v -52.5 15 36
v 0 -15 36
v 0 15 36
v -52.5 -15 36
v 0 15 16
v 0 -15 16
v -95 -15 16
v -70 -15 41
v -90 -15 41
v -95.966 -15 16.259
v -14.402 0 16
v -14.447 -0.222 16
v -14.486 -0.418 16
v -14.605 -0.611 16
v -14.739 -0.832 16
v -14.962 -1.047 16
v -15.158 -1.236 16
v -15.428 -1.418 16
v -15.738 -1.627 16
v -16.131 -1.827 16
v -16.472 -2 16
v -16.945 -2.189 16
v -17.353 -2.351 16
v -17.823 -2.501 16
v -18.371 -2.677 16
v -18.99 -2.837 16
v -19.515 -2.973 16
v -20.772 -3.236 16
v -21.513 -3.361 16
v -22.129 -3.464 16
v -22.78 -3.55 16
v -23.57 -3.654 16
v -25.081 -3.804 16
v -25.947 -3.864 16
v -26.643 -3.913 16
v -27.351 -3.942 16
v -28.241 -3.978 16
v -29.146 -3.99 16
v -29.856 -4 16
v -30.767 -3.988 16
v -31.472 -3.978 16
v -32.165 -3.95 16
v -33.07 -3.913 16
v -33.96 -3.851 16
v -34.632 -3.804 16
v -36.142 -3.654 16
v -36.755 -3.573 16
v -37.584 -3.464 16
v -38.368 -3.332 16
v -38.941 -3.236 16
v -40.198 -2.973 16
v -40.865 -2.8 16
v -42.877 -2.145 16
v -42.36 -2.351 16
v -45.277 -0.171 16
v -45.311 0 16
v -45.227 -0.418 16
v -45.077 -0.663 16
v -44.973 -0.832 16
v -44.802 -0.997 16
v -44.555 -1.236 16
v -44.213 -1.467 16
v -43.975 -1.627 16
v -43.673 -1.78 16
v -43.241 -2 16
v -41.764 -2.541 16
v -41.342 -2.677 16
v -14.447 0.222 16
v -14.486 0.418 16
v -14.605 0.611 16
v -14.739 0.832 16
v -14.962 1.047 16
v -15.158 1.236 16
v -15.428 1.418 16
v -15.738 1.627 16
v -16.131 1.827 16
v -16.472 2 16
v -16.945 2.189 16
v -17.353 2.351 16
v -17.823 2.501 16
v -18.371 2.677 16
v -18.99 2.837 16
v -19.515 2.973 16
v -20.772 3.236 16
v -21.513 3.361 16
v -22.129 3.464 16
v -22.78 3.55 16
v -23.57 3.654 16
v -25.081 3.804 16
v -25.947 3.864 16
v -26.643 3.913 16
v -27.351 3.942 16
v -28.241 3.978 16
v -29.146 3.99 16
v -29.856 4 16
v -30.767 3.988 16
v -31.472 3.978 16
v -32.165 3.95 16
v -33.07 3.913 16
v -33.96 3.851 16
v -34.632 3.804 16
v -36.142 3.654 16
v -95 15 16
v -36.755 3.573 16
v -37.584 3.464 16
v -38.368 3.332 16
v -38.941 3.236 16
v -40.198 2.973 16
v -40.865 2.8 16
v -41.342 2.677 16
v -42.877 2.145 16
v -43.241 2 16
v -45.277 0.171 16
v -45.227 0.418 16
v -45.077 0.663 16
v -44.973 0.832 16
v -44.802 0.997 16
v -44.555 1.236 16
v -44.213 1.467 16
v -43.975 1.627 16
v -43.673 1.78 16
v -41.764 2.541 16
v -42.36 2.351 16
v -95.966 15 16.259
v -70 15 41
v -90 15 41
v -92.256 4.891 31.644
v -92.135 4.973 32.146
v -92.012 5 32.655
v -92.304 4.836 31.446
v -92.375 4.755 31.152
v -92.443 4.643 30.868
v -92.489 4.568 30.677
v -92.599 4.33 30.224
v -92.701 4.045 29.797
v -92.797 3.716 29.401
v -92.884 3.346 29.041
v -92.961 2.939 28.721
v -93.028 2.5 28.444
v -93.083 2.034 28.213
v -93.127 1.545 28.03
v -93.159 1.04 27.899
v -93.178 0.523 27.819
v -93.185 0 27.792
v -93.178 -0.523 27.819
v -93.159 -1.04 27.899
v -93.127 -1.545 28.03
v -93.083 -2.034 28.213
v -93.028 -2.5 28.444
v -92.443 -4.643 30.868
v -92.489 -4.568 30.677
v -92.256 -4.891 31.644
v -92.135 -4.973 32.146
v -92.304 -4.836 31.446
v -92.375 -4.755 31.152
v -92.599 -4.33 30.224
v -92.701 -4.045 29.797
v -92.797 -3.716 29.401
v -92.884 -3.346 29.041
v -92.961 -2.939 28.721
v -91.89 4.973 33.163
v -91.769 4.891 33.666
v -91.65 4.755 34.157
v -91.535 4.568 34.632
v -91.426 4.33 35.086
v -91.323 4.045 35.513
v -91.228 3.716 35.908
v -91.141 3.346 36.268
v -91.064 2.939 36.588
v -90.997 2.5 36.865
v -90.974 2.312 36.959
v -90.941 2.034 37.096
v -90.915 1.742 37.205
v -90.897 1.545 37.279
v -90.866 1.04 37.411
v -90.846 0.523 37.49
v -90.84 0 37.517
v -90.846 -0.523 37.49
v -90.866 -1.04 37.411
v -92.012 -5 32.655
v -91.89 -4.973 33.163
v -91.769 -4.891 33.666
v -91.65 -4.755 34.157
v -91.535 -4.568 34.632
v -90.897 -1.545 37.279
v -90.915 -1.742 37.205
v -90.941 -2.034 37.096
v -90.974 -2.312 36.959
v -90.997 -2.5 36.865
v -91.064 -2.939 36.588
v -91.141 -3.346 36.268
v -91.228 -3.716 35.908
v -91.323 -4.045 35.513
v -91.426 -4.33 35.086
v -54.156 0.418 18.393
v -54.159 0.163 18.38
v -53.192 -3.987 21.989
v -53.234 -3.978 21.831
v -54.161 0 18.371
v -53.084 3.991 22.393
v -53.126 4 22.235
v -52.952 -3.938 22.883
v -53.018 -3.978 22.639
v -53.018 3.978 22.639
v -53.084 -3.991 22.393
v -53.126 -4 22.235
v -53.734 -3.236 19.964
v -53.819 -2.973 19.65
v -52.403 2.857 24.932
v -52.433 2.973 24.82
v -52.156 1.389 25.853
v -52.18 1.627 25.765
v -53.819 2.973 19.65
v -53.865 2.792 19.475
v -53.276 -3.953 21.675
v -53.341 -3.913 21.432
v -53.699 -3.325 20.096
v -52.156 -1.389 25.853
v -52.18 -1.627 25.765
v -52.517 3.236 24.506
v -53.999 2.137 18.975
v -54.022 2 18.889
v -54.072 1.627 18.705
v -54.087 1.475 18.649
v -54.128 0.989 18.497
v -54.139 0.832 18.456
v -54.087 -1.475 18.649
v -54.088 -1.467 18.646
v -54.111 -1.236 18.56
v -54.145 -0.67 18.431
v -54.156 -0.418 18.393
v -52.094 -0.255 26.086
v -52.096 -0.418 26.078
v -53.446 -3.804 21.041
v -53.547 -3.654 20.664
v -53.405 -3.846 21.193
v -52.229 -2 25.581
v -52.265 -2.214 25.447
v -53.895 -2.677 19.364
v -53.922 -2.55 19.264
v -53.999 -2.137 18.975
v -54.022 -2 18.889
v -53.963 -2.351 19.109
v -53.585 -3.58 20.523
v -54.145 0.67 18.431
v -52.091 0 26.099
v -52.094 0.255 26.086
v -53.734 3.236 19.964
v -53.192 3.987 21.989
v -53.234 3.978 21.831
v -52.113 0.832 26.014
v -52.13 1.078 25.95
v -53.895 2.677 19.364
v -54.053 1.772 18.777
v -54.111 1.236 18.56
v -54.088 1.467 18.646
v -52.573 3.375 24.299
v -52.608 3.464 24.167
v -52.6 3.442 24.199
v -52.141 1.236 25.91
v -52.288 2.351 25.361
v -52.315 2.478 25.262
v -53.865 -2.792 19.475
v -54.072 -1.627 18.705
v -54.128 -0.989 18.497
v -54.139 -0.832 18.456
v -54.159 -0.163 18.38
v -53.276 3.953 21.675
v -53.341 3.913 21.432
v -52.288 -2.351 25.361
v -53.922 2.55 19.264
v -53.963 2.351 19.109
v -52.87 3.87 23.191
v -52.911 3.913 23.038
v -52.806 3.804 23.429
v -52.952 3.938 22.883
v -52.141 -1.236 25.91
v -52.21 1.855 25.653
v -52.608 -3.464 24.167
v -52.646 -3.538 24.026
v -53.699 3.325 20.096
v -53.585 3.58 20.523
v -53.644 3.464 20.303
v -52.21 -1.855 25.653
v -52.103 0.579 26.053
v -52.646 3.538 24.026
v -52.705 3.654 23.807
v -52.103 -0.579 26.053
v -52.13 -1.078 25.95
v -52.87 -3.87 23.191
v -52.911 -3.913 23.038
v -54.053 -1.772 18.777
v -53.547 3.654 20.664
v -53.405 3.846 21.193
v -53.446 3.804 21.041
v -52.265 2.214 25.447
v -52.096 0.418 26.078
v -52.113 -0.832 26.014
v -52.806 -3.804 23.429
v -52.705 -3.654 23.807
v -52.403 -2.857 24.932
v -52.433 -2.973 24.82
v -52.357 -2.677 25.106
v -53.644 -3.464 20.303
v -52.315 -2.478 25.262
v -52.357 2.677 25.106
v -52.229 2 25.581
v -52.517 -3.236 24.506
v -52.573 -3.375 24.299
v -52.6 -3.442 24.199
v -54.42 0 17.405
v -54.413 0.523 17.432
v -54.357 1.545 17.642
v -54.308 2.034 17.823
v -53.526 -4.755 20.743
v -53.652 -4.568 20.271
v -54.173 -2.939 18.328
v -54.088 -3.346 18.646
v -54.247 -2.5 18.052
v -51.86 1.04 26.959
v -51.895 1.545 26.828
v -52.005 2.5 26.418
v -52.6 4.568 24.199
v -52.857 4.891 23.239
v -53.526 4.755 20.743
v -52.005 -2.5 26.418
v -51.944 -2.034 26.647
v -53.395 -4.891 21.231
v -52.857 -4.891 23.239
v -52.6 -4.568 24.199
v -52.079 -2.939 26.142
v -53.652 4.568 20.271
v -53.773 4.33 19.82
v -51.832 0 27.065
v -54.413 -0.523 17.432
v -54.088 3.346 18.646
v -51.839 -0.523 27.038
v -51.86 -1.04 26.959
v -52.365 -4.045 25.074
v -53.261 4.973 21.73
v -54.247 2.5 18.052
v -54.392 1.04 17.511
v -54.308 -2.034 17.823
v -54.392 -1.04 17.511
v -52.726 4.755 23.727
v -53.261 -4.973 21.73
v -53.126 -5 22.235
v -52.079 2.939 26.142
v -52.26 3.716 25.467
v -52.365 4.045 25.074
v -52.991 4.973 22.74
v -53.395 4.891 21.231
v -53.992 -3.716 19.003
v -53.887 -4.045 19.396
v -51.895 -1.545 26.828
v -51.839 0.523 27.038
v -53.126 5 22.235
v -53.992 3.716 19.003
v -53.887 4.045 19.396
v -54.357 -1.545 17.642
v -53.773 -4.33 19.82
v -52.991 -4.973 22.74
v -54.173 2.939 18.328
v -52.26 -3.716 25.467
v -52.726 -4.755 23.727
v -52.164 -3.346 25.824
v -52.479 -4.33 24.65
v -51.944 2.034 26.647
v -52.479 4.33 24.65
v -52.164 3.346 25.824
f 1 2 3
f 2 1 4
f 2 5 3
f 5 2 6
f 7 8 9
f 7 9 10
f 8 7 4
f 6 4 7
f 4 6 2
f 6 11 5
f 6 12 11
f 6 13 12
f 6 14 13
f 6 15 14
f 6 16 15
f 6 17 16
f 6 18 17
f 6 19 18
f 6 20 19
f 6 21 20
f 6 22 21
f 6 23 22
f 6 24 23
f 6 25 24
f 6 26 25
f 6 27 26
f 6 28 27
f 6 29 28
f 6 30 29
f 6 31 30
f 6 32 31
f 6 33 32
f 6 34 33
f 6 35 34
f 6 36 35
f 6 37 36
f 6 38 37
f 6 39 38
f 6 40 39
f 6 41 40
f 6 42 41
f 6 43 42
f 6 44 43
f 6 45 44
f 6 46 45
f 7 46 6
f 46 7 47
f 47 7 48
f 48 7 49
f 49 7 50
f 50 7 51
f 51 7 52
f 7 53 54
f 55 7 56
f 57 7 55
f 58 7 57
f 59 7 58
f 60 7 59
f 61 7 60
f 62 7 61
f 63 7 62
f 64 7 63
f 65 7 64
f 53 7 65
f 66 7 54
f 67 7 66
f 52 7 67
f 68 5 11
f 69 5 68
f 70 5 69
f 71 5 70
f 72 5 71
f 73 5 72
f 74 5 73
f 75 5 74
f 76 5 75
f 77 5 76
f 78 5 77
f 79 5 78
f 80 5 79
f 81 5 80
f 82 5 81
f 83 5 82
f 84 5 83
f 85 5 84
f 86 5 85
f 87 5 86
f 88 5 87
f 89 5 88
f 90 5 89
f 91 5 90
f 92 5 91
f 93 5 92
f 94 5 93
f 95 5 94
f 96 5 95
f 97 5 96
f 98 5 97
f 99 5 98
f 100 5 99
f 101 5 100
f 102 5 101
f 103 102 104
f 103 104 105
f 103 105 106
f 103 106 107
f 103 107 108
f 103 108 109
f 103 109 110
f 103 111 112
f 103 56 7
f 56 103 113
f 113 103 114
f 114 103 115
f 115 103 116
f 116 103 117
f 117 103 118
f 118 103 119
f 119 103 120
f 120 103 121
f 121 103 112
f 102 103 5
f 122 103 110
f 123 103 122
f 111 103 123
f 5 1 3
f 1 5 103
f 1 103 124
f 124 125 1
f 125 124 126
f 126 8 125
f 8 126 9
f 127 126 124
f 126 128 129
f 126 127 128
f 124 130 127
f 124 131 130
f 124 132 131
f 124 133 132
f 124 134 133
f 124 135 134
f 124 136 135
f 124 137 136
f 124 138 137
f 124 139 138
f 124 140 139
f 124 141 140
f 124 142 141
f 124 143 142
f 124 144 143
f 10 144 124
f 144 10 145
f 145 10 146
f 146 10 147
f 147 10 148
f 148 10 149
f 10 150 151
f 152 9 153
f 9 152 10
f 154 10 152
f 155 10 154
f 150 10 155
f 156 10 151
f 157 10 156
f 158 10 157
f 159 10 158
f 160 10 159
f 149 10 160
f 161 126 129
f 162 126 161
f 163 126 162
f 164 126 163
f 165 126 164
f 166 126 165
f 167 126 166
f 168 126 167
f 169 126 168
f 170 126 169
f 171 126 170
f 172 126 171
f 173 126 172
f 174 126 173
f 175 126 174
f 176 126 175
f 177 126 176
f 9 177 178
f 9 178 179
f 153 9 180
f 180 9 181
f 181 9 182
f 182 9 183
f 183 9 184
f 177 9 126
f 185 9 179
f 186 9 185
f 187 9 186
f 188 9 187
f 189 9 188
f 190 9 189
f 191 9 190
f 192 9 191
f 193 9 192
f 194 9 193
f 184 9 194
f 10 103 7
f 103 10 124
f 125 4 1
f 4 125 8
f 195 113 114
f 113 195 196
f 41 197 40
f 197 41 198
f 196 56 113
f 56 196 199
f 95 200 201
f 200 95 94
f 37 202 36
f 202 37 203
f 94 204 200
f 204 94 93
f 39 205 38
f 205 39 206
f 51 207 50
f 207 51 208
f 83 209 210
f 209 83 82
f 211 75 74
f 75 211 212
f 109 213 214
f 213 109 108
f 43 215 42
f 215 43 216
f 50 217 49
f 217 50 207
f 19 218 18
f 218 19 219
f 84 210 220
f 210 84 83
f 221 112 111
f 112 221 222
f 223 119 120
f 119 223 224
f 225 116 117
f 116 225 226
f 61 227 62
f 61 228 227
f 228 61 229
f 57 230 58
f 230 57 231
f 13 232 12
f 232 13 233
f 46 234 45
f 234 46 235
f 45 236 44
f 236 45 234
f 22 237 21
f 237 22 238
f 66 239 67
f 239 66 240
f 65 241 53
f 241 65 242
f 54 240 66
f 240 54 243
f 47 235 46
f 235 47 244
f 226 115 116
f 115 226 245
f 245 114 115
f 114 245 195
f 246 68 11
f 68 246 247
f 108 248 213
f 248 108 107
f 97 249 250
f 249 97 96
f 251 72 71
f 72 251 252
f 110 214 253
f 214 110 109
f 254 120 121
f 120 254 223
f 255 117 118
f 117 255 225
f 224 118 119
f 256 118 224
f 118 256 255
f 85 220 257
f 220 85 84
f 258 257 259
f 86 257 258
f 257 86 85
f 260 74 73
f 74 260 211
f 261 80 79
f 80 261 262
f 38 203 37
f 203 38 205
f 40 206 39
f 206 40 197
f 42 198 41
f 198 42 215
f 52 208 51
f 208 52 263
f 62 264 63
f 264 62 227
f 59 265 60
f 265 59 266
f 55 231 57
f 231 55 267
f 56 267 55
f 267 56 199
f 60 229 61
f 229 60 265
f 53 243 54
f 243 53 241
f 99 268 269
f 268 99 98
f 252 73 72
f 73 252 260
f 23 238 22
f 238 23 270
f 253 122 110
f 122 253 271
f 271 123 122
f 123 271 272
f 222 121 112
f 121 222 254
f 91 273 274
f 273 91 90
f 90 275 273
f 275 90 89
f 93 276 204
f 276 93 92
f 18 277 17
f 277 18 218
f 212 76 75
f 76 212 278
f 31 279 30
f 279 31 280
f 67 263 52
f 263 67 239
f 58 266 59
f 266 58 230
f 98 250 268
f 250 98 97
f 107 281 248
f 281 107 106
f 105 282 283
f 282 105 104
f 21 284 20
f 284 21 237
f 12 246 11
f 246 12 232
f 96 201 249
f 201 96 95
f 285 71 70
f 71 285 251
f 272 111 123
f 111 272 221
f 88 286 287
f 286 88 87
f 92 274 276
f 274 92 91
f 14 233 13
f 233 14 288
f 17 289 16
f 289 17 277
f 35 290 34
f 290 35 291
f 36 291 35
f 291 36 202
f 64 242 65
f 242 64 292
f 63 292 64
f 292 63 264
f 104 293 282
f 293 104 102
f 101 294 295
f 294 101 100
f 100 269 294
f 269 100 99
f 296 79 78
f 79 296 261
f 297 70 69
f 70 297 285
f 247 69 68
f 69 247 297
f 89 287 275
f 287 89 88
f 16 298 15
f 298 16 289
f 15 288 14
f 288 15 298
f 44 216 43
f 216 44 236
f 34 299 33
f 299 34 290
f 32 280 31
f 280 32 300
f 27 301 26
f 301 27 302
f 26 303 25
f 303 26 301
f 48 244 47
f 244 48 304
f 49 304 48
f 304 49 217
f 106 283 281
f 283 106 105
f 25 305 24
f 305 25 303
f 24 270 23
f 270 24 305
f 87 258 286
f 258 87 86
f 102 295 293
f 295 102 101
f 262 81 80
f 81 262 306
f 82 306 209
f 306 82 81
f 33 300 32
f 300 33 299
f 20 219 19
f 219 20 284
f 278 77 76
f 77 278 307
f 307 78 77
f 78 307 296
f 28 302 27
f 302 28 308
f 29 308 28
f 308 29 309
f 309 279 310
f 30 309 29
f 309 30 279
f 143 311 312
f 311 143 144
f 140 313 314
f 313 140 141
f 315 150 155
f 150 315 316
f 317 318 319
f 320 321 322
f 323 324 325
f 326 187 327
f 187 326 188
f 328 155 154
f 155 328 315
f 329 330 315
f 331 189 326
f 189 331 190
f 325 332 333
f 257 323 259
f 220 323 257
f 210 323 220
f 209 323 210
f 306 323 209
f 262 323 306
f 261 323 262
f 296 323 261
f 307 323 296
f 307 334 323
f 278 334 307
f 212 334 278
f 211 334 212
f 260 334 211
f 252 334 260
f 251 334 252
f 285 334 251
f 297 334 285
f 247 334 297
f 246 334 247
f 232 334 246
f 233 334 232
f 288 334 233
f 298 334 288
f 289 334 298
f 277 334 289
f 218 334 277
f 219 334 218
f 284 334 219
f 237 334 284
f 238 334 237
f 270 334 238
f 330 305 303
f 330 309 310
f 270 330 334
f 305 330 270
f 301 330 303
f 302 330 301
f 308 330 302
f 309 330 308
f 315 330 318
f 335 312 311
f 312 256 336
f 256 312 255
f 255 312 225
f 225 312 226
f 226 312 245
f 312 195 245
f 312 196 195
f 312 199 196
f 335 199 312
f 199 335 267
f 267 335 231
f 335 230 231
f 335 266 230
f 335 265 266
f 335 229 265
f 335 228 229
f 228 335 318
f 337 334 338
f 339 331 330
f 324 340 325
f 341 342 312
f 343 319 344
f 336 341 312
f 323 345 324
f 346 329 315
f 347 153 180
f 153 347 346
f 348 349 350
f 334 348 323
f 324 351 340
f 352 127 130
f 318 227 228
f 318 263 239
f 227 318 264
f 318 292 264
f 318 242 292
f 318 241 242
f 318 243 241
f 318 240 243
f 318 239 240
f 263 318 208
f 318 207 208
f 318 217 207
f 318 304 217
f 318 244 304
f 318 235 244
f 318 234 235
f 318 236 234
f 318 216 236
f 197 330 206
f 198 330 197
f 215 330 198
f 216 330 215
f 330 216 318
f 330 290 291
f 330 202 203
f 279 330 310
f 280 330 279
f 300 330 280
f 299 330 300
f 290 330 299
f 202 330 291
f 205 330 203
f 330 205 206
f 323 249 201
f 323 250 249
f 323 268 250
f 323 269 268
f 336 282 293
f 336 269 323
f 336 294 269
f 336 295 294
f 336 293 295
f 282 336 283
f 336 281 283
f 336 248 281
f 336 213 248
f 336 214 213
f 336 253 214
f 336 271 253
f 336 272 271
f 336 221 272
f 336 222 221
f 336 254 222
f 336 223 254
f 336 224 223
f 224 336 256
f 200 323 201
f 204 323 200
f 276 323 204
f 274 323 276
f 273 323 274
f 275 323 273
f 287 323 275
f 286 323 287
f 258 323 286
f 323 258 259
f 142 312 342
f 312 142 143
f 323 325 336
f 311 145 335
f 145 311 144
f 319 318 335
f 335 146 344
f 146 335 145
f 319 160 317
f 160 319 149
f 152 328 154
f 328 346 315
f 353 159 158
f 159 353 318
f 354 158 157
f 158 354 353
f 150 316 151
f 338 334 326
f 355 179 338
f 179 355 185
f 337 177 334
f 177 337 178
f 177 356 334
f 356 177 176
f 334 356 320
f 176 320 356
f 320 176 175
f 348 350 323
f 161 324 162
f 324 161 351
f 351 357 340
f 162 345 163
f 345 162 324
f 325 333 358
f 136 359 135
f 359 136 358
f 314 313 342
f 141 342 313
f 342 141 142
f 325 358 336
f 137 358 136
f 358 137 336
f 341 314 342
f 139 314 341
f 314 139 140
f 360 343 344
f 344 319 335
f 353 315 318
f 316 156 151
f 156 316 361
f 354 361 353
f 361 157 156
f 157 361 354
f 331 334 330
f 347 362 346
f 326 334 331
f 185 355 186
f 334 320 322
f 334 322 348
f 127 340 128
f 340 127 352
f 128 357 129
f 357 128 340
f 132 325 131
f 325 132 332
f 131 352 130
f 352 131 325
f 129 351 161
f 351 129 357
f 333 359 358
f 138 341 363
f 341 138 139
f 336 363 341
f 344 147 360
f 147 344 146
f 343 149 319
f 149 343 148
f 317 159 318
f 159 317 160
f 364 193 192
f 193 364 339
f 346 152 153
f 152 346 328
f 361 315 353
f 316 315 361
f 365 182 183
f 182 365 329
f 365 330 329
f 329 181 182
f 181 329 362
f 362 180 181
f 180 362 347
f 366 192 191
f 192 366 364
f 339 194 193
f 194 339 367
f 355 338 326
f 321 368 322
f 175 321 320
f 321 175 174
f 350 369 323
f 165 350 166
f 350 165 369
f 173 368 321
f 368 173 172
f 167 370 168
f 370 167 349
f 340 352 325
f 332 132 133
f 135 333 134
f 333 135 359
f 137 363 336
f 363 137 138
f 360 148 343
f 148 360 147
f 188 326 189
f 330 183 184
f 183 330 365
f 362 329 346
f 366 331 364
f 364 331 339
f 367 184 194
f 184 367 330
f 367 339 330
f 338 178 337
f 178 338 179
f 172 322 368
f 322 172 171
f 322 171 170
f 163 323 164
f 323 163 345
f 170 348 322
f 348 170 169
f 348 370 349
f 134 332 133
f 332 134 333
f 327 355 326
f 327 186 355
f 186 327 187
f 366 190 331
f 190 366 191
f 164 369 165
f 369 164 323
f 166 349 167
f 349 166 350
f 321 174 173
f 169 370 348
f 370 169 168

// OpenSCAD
dim_thickness = 16;
angle_screw = 15;
$fn=60;

jig();

module jig(){
	difference() {
		union(){
			//cube([55,50,dim_thickness]);
			//mirror([1,0,0])color([1,0,0])cube([50,50,dim_thickness]);
			color([0,1,0])translate([0,-15,dim_thickness])mirror([1,0,0])cube([90,30,20]);
			hull(){
				color([0,1,0])translate([-70,-15,dim_thickness + 20])mirror([1,0,0])cube([20,30,5]);
				color([0,1,0])translate([0,-15,dim_thickness])mirror([1,0,0])cube([20,30,5]);
				color([0,0,1])translate([-95,-15,dim_thickness])mirror([1,0,0])rotate([0,360-angle_screw,0])cube([1,30,25]);
			}

		}
		translate([0,0,0.5 * dim_thickness])rotate([0,90 + angle_screw,0])cylinder(r=4, h=500, center=true);
		translate([0,0,0.5 * dim_thickness])rotate([0,90 + angle_screw,0])translate([0,0,-105])cylinder(r=5, h=100, center=true);
	}
}

module stopper(){

difference() {

	cylinder(r=12, h=10,center = true);
	cylinder(r=4, h=11,center = true);
	translate([-1,0,-10])cube([2,15,20]);
	translate([0,7.5,0])rotate([0,90,0])cylinder(r=1.2,h=100,center = true);
	translate([0,7.5,0])rotate([0,90,0])cylinder(r=1.6,h=100);
	translate([5,7.5,0])rotate([0,90,0])cylinder(r=3.5,h=100);

}
}
